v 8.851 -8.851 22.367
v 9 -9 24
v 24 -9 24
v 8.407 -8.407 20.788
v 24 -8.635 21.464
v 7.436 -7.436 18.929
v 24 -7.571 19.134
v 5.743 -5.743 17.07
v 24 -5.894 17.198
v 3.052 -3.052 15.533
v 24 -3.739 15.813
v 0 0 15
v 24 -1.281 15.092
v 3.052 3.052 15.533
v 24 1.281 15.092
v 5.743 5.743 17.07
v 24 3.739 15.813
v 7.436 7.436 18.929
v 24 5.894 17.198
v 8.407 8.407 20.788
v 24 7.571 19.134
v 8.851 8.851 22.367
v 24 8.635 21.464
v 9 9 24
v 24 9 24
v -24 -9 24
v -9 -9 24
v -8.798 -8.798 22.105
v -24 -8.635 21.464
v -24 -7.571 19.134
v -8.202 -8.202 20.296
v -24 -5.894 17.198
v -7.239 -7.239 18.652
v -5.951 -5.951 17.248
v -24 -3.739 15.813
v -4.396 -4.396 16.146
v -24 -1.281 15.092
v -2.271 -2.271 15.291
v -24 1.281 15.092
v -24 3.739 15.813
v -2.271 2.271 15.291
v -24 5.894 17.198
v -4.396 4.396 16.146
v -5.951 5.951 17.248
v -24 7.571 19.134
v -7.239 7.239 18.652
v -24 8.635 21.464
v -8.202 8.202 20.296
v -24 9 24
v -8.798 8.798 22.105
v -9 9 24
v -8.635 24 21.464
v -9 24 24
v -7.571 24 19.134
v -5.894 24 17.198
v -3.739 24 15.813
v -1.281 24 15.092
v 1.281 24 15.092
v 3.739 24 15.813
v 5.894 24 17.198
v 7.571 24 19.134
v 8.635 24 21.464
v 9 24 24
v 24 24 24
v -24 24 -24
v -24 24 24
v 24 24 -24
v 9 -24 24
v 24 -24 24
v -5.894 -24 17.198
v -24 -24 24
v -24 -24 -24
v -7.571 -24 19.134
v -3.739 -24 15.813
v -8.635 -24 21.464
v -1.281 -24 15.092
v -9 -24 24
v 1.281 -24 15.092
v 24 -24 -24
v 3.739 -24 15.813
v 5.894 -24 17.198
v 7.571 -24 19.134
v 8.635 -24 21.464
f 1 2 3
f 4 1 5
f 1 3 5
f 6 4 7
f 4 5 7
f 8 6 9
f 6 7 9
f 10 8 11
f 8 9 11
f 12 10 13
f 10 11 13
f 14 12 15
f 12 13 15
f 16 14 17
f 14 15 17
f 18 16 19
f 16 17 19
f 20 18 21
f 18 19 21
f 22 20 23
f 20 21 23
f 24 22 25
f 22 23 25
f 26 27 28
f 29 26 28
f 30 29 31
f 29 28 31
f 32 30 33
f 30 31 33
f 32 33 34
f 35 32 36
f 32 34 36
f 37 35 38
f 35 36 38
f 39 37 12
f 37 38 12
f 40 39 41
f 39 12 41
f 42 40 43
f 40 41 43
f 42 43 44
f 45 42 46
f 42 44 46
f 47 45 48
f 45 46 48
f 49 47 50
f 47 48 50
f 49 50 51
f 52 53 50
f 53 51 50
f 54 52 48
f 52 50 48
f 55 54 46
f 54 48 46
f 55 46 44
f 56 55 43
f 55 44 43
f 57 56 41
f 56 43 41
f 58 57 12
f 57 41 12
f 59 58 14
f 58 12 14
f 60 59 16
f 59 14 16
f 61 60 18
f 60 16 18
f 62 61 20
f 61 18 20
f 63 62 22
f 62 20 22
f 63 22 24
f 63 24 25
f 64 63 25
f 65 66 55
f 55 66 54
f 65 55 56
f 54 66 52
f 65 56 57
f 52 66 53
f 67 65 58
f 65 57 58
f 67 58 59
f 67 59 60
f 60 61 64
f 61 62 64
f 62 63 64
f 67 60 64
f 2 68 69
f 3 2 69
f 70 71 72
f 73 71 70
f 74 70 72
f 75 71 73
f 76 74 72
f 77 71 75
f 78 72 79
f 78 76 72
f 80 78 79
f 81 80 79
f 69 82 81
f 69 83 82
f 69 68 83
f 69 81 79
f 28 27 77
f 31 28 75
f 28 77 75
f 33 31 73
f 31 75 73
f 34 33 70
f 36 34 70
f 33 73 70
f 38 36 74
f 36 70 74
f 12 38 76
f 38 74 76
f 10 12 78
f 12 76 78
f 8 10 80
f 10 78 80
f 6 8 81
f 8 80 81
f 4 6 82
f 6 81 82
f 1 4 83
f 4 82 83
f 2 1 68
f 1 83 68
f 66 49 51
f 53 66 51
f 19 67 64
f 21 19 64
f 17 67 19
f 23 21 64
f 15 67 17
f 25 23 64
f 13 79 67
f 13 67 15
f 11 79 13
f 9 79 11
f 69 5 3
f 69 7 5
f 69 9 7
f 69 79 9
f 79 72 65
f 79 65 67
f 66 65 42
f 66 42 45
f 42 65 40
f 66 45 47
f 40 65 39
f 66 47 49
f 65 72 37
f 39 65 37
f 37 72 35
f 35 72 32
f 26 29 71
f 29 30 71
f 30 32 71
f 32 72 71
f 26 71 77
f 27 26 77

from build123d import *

# Parameters (mm, degrees)
F0_W     = 48
F0_H     = 48
F1_DEPTH = 24
F2_R     = 9
F3_DEPTH = 48
F5_DEPTH = 48


with BuildPart() as f1:
    # F0 (on Front) → F1 (new body, symmetric)
    with BuildSketch(Plane.XZ):
        Rectangle(F0_W, F0_H)
    extrude(amount=F1_DEPTH, both=True)

    # F2 (on face) → F3 (cut)
    with BuildSketch(Plane.XZ.offset(24)):
        with Locations((0, 24)):
            Circle(F2_R)
    extrude(amount=-F3_DEPTH, mode=Mode.SUBTRACT)

    # F4 (on face) → F5 (cut)
    with BuildSketch(Plane.YZ.offset(24)):
        with BuildLine():
            ThreePointArc((-9, 24), (0, 15), (9, 24))
            Line((9, 24), (-9, 24))
        make_face()
    extrude(amount=-F5_DEPTH, mode=Mode.SUBTRACT)


solid = f1.part
